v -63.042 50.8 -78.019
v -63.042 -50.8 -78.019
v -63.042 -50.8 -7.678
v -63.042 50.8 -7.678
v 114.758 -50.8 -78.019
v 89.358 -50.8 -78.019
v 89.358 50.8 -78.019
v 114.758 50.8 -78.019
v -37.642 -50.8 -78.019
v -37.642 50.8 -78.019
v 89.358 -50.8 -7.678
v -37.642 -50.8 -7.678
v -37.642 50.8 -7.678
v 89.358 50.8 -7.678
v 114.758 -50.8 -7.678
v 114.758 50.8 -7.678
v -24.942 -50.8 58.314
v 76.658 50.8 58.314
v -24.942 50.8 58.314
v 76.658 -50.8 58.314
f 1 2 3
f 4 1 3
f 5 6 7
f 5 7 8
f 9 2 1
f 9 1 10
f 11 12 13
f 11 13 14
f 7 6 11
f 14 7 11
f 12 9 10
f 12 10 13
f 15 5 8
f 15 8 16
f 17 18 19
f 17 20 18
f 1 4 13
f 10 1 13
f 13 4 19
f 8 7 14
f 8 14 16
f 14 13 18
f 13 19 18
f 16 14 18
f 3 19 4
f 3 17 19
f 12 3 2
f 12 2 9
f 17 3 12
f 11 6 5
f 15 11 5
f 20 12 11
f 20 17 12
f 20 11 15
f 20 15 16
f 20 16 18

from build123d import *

# Parameters (mm, degrees)
F0_W     = 25.4
F0_H     = 70.3412795041
F1_DEPTH = 50.8


with BuildPart() as f1:
    # F0 (on Front) → F1 (new body, symmetric)
    with BuildSketch(Plane.XZ):
        with Locations((-50.3423148662, -42.8482267274)):
            Rectangle(F0_W, F0_H)
        Polygon((76.6576851338, 58.313548793), (-24.9423148662, 58.313548793), (-63.0423148662, -7.6775869753), (-37.6423148662, -7.6775869753), (89.3576851338, -7.6775869753), (114.7576851338, -7.6775869753), align=None)
        with Locations((102.0576851338, -42.8482267274)):
            Rectangle(F0_W, F0_H)
    extrude(amount=F1_DEPTH, both=True)


solid = f1.part
